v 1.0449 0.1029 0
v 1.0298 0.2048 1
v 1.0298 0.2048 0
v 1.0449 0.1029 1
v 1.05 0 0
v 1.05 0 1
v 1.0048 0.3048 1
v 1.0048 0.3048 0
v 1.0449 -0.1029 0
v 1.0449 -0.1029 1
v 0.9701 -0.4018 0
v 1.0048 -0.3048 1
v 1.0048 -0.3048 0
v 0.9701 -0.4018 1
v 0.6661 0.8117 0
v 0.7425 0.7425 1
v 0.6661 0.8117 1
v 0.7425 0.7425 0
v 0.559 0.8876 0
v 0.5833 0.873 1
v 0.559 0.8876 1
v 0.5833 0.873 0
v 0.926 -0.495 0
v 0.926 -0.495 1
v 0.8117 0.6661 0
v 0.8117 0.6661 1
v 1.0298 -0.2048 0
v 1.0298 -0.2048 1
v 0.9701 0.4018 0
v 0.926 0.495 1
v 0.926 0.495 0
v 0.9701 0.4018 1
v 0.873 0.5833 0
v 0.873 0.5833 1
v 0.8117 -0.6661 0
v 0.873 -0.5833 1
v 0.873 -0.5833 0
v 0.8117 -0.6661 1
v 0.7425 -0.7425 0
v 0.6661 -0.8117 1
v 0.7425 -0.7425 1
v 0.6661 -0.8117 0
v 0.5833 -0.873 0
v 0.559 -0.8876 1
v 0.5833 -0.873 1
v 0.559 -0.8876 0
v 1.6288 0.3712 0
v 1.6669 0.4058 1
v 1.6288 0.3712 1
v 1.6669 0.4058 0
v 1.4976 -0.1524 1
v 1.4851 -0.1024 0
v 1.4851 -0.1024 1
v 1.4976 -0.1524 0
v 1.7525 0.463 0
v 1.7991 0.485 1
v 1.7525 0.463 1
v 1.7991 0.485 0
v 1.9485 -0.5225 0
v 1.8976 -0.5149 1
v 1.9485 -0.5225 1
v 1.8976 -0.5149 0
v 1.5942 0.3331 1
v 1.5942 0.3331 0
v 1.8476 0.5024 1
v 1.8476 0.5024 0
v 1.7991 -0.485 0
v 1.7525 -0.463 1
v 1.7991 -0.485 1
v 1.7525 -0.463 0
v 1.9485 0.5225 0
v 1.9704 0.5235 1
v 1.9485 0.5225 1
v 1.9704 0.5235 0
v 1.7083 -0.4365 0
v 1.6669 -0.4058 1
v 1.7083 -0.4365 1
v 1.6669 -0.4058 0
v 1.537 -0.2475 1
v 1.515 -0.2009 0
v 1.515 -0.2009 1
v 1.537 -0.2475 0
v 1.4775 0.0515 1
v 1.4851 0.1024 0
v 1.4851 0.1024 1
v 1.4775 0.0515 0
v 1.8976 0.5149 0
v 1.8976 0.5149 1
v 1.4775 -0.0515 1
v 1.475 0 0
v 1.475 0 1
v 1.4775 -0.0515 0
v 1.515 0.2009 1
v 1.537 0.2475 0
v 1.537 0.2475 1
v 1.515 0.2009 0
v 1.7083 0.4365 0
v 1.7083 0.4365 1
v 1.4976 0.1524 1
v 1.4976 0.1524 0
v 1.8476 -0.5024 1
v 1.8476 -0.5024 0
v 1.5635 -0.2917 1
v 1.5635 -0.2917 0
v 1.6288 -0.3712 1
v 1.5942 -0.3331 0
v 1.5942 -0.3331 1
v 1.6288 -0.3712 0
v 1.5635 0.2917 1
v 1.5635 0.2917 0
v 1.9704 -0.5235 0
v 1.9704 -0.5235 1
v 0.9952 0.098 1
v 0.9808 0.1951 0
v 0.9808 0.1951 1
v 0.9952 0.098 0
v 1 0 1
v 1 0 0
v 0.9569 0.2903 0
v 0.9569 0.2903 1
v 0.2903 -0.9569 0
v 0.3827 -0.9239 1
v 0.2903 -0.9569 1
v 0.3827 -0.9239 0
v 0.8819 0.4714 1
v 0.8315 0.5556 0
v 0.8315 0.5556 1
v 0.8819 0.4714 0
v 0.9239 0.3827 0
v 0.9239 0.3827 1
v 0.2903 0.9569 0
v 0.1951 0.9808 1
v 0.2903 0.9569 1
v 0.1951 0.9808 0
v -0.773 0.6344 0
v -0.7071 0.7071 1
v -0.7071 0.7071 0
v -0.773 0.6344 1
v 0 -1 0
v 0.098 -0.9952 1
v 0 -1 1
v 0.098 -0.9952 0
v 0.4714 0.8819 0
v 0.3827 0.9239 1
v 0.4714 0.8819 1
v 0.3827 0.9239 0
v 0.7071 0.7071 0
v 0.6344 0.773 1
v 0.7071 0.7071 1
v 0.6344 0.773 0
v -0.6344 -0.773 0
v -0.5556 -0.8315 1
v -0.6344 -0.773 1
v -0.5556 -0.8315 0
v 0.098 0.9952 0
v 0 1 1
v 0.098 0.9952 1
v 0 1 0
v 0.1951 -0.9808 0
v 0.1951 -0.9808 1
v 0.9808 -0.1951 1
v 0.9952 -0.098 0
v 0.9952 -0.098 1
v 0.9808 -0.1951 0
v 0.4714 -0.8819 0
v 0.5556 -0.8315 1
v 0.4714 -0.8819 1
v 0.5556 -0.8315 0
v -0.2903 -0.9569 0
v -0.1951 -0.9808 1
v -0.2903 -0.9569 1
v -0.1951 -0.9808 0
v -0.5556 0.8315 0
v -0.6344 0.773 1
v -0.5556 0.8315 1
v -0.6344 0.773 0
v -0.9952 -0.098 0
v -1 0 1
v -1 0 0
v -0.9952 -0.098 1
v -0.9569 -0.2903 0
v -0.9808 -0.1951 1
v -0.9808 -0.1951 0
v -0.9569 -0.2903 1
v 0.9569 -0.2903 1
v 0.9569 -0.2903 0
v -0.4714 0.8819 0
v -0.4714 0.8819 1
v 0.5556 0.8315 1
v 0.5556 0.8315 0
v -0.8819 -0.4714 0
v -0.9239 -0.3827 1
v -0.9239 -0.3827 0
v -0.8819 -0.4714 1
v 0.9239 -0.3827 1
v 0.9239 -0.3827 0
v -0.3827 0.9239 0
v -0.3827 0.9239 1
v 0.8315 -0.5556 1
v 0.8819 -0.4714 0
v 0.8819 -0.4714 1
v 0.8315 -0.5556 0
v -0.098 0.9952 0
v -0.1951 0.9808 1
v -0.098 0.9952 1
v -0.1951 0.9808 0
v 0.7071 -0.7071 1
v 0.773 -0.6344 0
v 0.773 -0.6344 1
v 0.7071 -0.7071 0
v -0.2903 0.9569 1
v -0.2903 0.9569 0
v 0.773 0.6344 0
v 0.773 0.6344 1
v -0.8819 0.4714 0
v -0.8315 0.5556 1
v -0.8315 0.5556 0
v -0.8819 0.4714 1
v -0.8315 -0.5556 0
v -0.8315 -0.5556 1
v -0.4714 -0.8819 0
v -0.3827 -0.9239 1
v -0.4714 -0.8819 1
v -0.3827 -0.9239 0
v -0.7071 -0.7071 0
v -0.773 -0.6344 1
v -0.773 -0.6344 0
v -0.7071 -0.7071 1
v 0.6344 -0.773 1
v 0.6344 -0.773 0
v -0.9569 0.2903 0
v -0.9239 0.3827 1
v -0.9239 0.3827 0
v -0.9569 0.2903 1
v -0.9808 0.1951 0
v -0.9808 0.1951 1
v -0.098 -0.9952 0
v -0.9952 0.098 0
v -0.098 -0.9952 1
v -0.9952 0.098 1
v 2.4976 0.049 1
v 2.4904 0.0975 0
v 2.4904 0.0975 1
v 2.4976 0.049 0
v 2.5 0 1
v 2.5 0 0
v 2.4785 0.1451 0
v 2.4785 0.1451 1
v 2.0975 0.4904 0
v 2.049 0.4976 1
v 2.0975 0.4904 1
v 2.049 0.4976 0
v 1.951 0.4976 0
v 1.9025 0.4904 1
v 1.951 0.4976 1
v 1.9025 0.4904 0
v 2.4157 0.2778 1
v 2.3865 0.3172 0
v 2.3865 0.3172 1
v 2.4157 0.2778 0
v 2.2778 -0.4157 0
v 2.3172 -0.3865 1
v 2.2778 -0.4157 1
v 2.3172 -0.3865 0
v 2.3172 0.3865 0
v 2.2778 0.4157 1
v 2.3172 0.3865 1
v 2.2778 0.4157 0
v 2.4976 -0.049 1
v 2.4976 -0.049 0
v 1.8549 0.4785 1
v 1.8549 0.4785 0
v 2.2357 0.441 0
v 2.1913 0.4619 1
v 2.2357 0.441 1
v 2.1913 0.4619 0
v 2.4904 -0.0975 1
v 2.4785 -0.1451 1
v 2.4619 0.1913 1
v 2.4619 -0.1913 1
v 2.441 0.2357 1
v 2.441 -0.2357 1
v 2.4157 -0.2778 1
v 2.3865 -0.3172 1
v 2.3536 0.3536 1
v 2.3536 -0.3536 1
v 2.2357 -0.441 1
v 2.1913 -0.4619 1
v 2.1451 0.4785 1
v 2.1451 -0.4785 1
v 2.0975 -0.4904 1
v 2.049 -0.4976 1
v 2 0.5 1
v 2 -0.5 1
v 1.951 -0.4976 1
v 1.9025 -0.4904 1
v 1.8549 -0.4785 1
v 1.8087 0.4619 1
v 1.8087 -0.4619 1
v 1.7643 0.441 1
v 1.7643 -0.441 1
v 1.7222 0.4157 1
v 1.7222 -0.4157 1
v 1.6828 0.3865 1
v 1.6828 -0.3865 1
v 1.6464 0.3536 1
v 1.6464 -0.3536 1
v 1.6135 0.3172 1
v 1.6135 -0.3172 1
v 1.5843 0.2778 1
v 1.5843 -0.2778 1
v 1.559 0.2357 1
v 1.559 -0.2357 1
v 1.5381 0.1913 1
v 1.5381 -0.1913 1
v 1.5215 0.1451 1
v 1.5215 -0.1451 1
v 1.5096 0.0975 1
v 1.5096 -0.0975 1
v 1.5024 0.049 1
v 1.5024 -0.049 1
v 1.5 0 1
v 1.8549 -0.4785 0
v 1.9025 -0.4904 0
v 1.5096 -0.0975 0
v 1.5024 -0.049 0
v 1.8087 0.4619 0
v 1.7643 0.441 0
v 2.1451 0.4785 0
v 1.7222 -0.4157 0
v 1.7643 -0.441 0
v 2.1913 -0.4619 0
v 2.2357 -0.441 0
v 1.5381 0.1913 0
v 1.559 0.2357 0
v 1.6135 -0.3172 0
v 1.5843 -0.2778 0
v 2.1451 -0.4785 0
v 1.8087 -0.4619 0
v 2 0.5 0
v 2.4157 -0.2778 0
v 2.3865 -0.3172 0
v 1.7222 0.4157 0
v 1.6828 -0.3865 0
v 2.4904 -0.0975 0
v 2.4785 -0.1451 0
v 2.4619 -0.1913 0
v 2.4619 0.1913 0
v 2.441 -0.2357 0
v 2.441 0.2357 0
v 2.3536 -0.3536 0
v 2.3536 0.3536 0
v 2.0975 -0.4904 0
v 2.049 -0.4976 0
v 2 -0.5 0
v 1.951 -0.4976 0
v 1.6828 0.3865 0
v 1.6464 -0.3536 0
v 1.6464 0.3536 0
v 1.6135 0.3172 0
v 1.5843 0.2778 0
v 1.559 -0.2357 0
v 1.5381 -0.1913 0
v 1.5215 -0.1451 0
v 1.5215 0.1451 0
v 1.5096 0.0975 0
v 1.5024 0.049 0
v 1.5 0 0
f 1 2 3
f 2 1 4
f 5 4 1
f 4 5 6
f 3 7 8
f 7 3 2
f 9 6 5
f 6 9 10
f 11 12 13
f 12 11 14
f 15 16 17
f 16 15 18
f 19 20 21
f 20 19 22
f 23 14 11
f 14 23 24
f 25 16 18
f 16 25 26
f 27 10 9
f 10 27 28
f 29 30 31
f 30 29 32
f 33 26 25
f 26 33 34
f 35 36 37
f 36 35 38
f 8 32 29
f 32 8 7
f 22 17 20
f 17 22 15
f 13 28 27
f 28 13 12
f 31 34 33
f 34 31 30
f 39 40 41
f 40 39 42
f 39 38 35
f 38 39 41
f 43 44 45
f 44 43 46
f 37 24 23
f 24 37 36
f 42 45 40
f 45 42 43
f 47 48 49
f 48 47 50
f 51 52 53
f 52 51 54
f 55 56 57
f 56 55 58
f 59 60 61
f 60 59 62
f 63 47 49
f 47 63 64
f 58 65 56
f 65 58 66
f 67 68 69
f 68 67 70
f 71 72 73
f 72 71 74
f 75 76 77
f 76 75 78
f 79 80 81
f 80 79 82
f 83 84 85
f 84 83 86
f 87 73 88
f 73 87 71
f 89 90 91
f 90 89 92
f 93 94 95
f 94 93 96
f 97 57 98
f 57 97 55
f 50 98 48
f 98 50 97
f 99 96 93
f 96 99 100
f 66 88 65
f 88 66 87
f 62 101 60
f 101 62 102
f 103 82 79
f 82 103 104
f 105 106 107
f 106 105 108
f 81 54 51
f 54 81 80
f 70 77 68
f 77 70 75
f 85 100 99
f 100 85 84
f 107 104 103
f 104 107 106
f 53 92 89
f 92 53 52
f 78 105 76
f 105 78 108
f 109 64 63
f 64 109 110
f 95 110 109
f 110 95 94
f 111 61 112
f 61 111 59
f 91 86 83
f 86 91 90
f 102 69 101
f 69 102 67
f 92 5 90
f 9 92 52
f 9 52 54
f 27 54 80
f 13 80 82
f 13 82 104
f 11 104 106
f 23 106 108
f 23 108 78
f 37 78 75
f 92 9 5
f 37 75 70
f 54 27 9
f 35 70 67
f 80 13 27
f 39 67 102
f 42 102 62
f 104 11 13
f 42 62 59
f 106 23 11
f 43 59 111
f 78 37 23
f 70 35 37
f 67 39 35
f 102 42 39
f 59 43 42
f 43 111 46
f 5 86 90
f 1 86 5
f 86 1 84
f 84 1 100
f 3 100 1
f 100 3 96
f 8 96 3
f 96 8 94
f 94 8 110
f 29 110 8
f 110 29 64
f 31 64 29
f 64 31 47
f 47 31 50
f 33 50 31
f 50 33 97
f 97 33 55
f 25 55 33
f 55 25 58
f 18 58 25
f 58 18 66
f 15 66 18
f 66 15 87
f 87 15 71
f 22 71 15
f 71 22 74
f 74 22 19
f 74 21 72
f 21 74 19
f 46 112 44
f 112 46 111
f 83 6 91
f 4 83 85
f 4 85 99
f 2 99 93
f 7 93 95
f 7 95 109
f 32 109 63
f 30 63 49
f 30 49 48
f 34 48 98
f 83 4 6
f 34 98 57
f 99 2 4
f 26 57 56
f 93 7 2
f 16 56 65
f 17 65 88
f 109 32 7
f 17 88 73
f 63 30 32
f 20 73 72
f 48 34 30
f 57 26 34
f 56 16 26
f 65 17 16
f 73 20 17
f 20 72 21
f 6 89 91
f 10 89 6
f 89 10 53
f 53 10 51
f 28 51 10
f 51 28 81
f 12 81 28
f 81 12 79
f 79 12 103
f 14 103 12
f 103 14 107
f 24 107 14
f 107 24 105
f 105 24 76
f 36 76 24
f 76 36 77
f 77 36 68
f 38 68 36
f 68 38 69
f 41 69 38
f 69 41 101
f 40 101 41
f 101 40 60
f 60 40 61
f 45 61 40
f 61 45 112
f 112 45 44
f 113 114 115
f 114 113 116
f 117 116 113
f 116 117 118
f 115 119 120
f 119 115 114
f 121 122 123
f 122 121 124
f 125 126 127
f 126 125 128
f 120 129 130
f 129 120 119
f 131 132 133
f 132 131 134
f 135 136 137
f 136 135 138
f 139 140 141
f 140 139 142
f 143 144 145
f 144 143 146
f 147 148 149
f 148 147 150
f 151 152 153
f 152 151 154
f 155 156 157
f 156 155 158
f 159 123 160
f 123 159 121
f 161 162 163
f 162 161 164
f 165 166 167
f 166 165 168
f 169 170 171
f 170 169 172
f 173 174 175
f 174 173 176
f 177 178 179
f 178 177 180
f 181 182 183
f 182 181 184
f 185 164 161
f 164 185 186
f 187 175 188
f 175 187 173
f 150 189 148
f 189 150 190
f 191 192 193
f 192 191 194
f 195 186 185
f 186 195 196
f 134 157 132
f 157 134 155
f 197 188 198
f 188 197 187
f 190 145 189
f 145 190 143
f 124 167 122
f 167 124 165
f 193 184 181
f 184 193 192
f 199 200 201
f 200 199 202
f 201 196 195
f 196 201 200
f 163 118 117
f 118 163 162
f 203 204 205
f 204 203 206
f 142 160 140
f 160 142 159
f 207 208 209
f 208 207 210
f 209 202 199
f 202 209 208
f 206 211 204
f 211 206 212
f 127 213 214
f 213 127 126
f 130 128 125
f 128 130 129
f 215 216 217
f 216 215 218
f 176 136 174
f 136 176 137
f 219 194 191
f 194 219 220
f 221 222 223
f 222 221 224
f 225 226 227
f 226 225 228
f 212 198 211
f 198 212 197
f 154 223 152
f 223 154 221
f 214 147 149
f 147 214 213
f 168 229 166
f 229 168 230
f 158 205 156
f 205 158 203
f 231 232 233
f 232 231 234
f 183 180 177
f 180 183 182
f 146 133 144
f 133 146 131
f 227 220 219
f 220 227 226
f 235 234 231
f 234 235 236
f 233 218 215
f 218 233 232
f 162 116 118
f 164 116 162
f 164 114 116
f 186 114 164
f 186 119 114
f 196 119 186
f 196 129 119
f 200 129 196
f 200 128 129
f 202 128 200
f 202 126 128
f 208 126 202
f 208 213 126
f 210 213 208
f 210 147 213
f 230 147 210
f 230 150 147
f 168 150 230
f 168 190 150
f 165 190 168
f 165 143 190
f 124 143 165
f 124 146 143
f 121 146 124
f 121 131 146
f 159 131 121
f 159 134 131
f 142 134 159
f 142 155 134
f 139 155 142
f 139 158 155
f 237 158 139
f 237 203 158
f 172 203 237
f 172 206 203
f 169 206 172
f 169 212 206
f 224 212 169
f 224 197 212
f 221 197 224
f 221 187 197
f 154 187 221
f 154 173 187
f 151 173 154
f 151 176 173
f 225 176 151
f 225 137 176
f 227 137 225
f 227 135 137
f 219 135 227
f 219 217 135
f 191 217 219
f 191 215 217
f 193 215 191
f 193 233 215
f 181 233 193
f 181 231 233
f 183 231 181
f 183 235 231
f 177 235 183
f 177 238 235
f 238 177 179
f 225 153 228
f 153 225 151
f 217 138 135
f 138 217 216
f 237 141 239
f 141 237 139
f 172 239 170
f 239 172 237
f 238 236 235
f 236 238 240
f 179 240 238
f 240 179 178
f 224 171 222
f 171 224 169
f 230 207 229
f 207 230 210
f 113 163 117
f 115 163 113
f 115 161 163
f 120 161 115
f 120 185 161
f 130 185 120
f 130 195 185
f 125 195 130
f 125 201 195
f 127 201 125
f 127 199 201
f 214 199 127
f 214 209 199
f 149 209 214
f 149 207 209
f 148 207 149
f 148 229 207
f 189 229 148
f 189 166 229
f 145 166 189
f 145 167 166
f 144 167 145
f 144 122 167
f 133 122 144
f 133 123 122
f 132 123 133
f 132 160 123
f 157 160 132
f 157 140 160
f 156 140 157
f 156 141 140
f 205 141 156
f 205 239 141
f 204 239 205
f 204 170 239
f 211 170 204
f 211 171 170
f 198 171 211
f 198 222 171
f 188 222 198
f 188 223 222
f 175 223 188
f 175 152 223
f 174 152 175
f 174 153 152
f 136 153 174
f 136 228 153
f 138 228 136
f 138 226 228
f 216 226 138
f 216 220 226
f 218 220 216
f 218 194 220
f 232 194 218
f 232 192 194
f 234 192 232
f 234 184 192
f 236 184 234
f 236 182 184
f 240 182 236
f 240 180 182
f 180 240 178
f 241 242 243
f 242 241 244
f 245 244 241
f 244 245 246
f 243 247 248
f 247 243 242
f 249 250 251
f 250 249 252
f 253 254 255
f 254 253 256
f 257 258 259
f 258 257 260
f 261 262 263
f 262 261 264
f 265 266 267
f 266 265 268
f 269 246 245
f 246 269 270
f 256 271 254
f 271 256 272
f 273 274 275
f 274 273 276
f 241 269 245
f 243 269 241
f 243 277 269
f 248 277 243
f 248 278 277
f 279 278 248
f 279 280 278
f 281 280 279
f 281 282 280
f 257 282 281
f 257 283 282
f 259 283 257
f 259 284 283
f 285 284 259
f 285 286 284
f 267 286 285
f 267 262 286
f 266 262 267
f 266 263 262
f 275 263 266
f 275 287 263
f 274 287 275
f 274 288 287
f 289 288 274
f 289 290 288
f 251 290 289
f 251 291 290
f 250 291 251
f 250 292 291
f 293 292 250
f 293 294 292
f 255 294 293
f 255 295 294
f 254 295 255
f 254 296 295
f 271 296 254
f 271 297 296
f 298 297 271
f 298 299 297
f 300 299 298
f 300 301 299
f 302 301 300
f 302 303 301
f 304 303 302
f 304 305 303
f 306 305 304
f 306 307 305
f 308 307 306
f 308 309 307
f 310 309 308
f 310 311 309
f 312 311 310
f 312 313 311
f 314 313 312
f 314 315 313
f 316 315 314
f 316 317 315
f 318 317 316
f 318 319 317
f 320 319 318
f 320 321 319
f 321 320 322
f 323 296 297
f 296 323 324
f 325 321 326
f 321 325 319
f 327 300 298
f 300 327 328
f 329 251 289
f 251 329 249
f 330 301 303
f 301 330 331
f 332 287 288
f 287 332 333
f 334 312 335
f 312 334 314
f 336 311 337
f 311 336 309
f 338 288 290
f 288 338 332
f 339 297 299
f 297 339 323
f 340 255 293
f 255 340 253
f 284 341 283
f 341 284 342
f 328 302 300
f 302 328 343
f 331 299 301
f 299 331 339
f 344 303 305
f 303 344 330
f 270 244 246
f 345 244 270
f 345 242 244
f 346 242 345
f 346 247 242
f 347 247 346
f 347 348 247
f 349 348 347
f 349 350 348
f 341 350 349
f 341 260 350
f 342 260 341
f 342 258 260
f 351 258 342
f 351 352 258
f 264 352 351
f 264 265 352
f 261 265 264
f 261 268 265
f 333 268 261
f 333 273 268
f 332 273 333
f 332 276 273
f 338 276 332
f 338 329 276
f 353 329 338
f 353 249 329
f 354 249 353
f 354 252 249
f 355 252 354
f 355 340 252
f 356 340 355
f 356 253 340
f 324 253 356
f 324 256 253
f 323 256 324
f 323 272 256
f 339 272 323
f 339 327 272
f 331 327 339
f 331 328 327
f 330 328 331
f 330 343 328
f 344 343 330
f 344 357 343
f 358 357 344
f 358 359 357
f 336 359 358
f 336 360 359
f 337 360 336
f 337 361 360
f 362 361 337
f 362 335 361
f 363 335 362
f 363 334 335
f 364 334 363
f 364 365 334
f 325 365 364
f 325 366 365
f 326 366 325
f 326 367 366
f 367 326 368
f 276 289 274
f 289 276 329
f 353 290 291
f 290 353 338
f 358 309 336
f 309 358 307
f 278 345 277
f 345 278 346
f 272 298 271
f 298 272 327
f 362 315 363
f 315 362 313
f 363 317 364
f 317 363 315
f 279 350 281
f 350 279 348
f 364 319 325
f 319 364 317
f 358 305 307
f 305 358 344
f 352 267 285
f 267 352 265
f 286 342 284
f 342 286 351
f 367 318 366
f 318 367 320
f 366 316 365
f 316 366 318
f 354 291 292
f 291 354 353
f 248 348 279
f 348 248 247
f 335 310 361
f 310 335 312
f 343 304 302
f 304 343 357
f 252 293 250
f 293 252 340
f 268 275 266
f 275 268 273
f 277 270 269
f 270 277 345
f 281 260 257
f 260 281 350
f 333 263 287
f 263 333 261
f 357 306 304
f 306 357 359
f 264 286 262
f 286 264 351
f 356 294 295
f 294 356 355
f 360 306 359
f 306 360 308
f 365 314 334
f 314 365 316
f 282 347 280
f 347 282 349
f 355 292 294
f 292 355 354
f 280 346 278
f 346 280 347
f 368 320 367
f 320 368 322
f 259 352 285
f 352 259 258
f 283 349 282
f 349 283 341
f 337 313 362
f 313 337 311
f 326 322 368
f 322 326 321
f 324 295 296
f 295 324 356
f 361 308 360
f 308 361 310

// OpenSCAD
//------------------------------------------------------------------------------------------
// THIS CODE WAS GENERATED WITH GRAPHSCAD
//------------------------------------------------------------------------------------------
// Graphscad is a graphical nodal editor to create .SCAD files
//
// More info : http://graphscad.free.fr
//
// Scad Files created with Graphscad can be edited by graphscad
// Scad Files created with Graphscad can be read by Openscad
//
//------------------------------------------------------------------------------------------
module hulldemo()
{
 function node_cylinder_matrix(i=0,j=0,k=0,l=0,m=0,n=0) = translate([0,0,0]);
 module node_cylinder(i=0,j=0,k=0,l=0,m=0,n=0)
 {
  cylinder(r=1,r1=1,h=1,$fn=64);
 }
 function node_cylinder0_matrix(i=0,j=0,k=0,l=0,m=0,n=0) = translate([2,0,0]);
 module node_cylinder0(i=0,j=0,k=0,l=0,m=0,n=0)
 {
  translate([2,0,0])cylinder(r=0.5,r1=0.5,h=1,$fn=64);
 }
 function node_boolean0_matrix(i=0,j=0,k=0,l=0,m=0,n=0) = node_scale0_matrix(i=i,j=j,k=k,l=l,m=m,n=n);
 module node_boolean0(i=0,j=0,k=0,l=0,m=0,n=0)
 {
  union()
  {
   node_scale0(i,j,k,l,m,n);
   node_scale1(i,j,k,l,m,n);
  }
 }
 function node_hull_matrix(i=0,j=0,k=0,l=0,m=0,n=0) = node_cylinder_matrix(i=i,j=j,k=k,l=l,m=m,n=n);
 module node_hull(i=0,j=0,k=0,l=0,m=0,n=0)
 {
  hull()
  {
   node_cylinder(i,j,k,l,m,n);
   node_cylinder0(i,j,k,l,m,n);
  }
 }
 function node_boolean_matrix(i=0,j=0,k=0,l=0,m=0,n=0) = node_hull_matrix(i=i,j=j,k=k,l=l,m=m,n=n);
 module node_boolean(i=0,j=0,k=0,l=0,m=0,n=0)
 {
  difference()
  {
   node_hull(i,j,k,l,m,n);
   node_scale(i,j,k,l,m,n);
  }
 }
 function node_translate_matrix(i=0,j=0,k=0,l=0,m=0,n=0) = translate([0,0,-0.1])*node_boolean0_matrix(i=i,j=j,k=k,l=l,m=m,n=n);
 module node_translate(i=0,j=0,k=0,l=0,m=0,n=0)
 {
  translate([0,0,-0.1])node_boolean0(i,j,k,l,m,n);
 }
 function node_scale_matrix(i=0,j=0,k=0,l=0,m=0,n=0) = scale([1,1,2])*node_translate_matrix(i=i,j=j,k=k,l=l,m=m,n=n);
 module node_scale(i=0,j=0,k=0,l=0,m=0,n=0)
 {
  scale([1,1,2])node_translate(i,j,k,l,m,n);
 }
 function node_scale0_matrix(i=0,j=0,k=0,l=0,m=0,n=0) = onlytranslate(node_cylinder_matrix(i=i,j=j,k=k,l=l,m=m,n=n))*scale([1.05,1.05,1])*negonlytranslate(node_cylinder_matrix(i=i,j=j,k=k,l=l,m=m,n=n))*node_cylinder_matrix(i=i,j=j,k=k,l=l,m=m,n=n);
 module node_scale0(i=0,j=0,k=0,l=0,m=0,n=0)
 {
  multmatrix(m=onlytranslate(node_cylinder_matrix(i=i,j=j,k=k,l=l,m=m,n=n))*scale([1.05,1.05,1])*negonlytranslate(node_cylinder_matrix(i=i,j=j,k=k,l=l,m=m,n=n)))node_cylinder(i,j,k,l,m,n);
 }
 function node_scale1_matrix(i=0,j=0,k=0,l=0,m=0,n=0) = onlytranslate(node_cylinder0_matrix(i=i,j=j,k=k,l=l,m=m,n=n))*scale([1.05,1.05,1])*negonlytranslate(node_cylinder0_matrix(i=i,j=j,k=k,l=l,m=m,n=n))*node_cylinder0_matrix(i=i,j=j,k=k,l=l,m=m,n=n);
 module node_scale1(i=0,j=0,k=0,l=0,m=0,n=0)
 {
  multmatrix(m=onlytranslate(node_cylinder0_matrix(i=i,j=j,k=k,l=l,m=m,n=n))*scale([1.05,1.05,1])*negonlytranslate(node_cylinder0_matrix(i=i,j=j,k=k,l=l,m=m,n=n)))node_cylinder0(i,j,k,l,m,n);
 }
 function node_boolean1_matrix(i=0,j=0,k=0,l=0,m=0,n=0) = node_cylinder_matrix(i=i,j=j,k=k,l=l,m=m,n=n);
 module node_boolean1(i=0,j=0,k=0,l=0,m=0,n=0)
 {
  union()
  {
   node_cylinder(i,j,k,l,m,n);
   node_cylinder0(i,j,k,l,m,n);
  }
 }
 function node_color_matrix(i=0,j=0,k=0,l=0,m=0,n=0) = node_boolean_matrix(i=i,j=j,k=k,l=l,m=m,n=n);
 module node_color(i=0,j=0,k=0,l=0,m=0,n=0)
 {
  {
   color([1,1,0,1])node_boolean(i,j,k,l,m,n);
  }
 }
 function node_color0_matrix(i=0,j=0,k=0,l=0,m=0,n=0) = node_boolean1_matrix(i=i,j=j,k=k,l=l,m=m,n=n);
 module node_color0(i=0,j=0,k=0,l=0,m=0,n=0)
 {
  {
   color([1,0,0,0.6])node_boolean1(i,j,k,l,m,n);
  }
 }
 node_color();
 node_color0();
 /*--------------------------------------------------------------------------------------------------------
  Graphscad Utils functions
  This code is Used By Graphscad Nodal Editor to generate SCAD files
 --------------------------------------------------------------------------------------------------------*/
 function det4x4(a) =
 a[0][0]*a[1][1]*a[2][2]*a[3][3] + a[0][0]*a[1][2]*a[2][3]*a[3][1] + a[0][0]*a[1][3]*a[2][1]*a[3][2]
 + a[0][1]*a[1][0]*a[2][3]*a[3][2] + a[0][1]*a[1][2]*a[2][0]*a[3][3] + a[0][1]*a[1][3]*a[2][2]*a[3][0]
 + a[0][2]*a[1][0]*a[2][1]*a[3][3] + a[0][2]*a[1][1]*a[2][3]*a[3][0] + a[0][2]*a[1][3]*a[2][0]*a[3][1]
 + a[0][3]*a[1][0]*a[2][2]*a[3][1] + a[0][3]*a[1][1]*a[2][0]*a[3][2] + a[0][3]*a[1][2]*a[2][1]*a[3][0]
 - a[0][0]*a[1][1]*a[2][3]*a[3][2] - a[0][0]*a[1][2]*a[2][1]*a[3][3] - a[0][0]*a[1][3]*a[2][2]*a[3][1]
 - a[0][1]*a[1][0]*a[2][2]*a[3][3] - a[0][1]*a[1][2]*a[2][3]*a[3][0] - a[0][1]*a[1][3]*a[2][0]*a[3][2]
 - a[0][2]*a[1][0]*a[2][3]*a[3][1] - a[0][2]*a[1][1]*a[2][0]*a[3][3] - a[0][2]*a[1][3]*a[2][1]*a[3][0]
 - a[0][3]*a[1][0]*a[2][1]*a[3][2] - a[0][3]*a[1][1]*a[2][2]*a[3][0] - a[0][3]*a[1][2]*a[2][0]*a[3][1];
 function invb00(a) = a[1][1]*a[2][2]*a[3][3] + a[1][2]*a[2][3]*a[3][1] + a[1][3]*a[2][1]*a[3][2] - a[1][1]*a[2][3]*a[3][2] - a[1][2]*a[2][1]*a[3][3] - a[1][3]*a[2][2]*a[3][1];
 function invb01(a) = a[0][1]*a[2][3]*a[3][2] + a[0][2]*a[2][1]*a[3][3] + a[0][3]*a[2][2]*a[3][1] - a[0][1]*a[2][2]*a[3][3] - a[0][2]*a[2][3]*a[3][1] - a[0][3]*a[2][1]*a[3][2];
 function invb02(a) = a[0][1]*a[1][2]*a[3][3] + a[0][2]*a[1][3]*a[3][1] + a[0][3]*a[1][1]*a[3][2] - a[0][1]*a[1][3]*a[3][2] - a[0][2]*a[1][1]*a[3][3] - a[0][3]*a[1][2]*a[3][1];
 function invb03(a) = a[0][1]*a[1][3]*a[2][2] + a[0][2]*a[1][1]*a[2][3] + a[0][3]*a[1][2]*a[2][1] - a[0][1]*a[1][2]*a[2][3] - a[0][2]*a[1][3]*a[2][1] - a[0][3]*a[1][1]*a[2][2];
 function invb10(a) = a[1][0]*a[2][3]*a[3][2] + a[1][2]*a[2][0]*a[3][3] + a[1][3]*a[2][2]*a[3][0] - a[1][0]*a[2][2]*a[3][3] - a[1][2]*a[2][3]*a[3][0] - a[1][3]*a[2][0]*a[3][2];
 function invb11(a) = a[0][0]*a[2][2]*a[3][3] + a[0][2]*a[2][3]*a[3][0] + a[0][3]*a[2][0]*a[3][2] - a[0][0]*a[2][3]*a[3][2] - a[0][2]*a[2][0]*a[3][3] - a[0][3]*a[2][2]*a[3][0];
 function invb12(a) = a[0][0]*a[1][3]*a[3][2] + a[0][2]*a[1][0]*a[3][3] + a[0][3]*a[1][2]*a[3][0] - a[0][0]*a[1][2]*a[3][3] - a[0][2]*a[1][3]*a[3][0] - a[0][3]*a[1][0]*a[3][2];
 function invb13(a) = a[0][0]*a[1][2]*a[2][3] + a[0][2]*a[1][3]*a[2][0] + a[0][3]*a[1][0]*a[2][2] - a[0][0]*a[1][3]*a[2][2] - a[0][2]*a[1][0]*a[2][3] - a[0][3]*a[1][2]*a[2][0];
 function invb20(a) = a[1][0]*a[2][1]*a[3][3] + a[1][1]*a[2][3]*a[3][0] + a[1][3]*a[2][0]*a[3][1] - a[1][0]*a[2][3]*a[3][1] - a[1][1]*a[2][0]*a[3][3] - a[1][3]*a[2][1]*a[3][0];
 function invb21(a) = a[0][0]*a[2][3]*a[3][1] + a[0][1]*a[2][0]*a[3][3] + a[0][3]*a[2][1]*a[3][0] - a[0][0]*a[2][1]*a[3][3] - a[0][1]*a[2][3]*a[3][0] - a[0][3]*a[2][0]*a[3][1];
 function invb22(a) = a[0][0]*a[1][1]*a[3][3] + a[0][1]*a[1][3]*a[3][0] + a[0][3]*a[1][0]*a[3][1] - a[0][0]*a[1][3]*a[3][1] - a[0][1]*a[1][0]*a[3][3] - a[0][3]*a[1][1]*a[3][0];
 function invb23(a) = a[0][0]*a[1][3]*a[2][1] + a[0][1]*a[1][0]*a[2][3] + a[0][3]*a[1][1]*a[2][0] - a[0][0]*a[1][1]*a[2][3] - a[0][1]*a[1][3]*a[2][0] - a[0][3]*a[1][0]*a[2][1];
 function invb30(a) = a[1][0]*a[2][2]*a[3][1] + a[1][1]*a[2][0]*a[3][2] + a[1][2]*a[2][1]*a[3][0] - a[1][0]*a[2][1]*a[3][2] - a[1][1]*a[2][2]*a[3][0] - a[1][2]*a[2][0]*a[3][1];
 function invb31(a) = a[0][0]*a[2][1]*a[3][2] + a[0][1]*a[2][2]*a[3][0] + a[0][2]*a[2][0]*a[3][1] - a[0][0]*a[2][2]*a[3][1] - a[0][1]*a[2][0]*a[3][2] - a[0][2]*a[2][1]*a[3][0];
 function invb32(a) = a[0][0]*a[1][2]*a[3][1] + a[0][1]*a[1][0]*a[3][2] + a[0][2]*a[1][1]*a[3][0] - a[0][0]*a[1][1]*a[3][2] - a[0][1]*a[1][2]*a[3][0] - a[0][2]*a[1][0]*a[3][1];
 function invb33(a) = a[0][0]*a[1][1]*a[2][2] + a[0][1]*a[1][2]*a[2][0] + a[0][2]*a[1][0]*a[2][1] - a[0][0]*a[1][2]*a[2][1] - a[0][1]*a[1][0]*a[2][2] - a[0][2]*a[1][1]*a[2][0];
 function inv4x4(a)= (1/det4x4(a))*[
 [invb00(a),invb01(a),invb02(a),invb03(a)],
 [invb10(a),invb11(a),invb12(a),invb13(a)],
 [invb20(a),invb21(a),invb22(a),invb23(a)],
 [invb30(a),invb31(a),invb32(a),invb33(a)]];
 function onlytranslate(a)=  [
                        [1,0,0,a[0][3]],
                        [0,1,0,a[1][3]],
                        [0,0,1,a[2][3]],
                        [0,0,0,1]];
 function negonlytranslate(a)=[
                        [1,0,0,-a[0][3]],
                        [0,1,0,-a[1][3]],
                        [0,0,1,-a[2][3]],
                        [0,0,0,1]];
 function lookatvec(t,parentmat) = [t[0]-parentmat[0][3],
                                 t[1]-parentmat[1][3],
                                 t[2]-parentmat[2][3]];
 /*
              rx = '0'
              ry = 'acos('+tz+'/norm(['+tx+','+ty+','+tz+']))'
              rz = 'atan2('+ty+','+tx+')'
 */
 function lookatrot(t,parentmat) = [0,
                                 acos((t[2]-parentmat[2][3])/norm(lookatvec(t,parentmat))),
                                 atan2(t[1]-parentmat[1][3],t[0]-parentmat[0][3])];
 function gettranslation(m) = [m[0][3],m[1][3],m[2][3]];
 function vectormulmatrix(v,m) = m*v;
 function vectorlength(v) = norm(v);
 function vectorx(v) = v[0];
 function vectory(v) = v[1];
 function vectorz(v) = v[2];
 function vectoradd(a,b) = (a+b);
 function vectorsub(a,b) = (a-b);
 function vectormul(a,b) = (a*b);
 function vectordiv(a,b) = (a*(1/b));
 function scale(v)=[[v[0],0,0,0],
                    [0,v[1],0,0],
                    [0,0,v[2],0],
                    [0,0,0,1]];
 function rotatex(a)=[[1,0,0,0],
                      [0,cos(a),-sin(a),0],
                      [0,sin(a),cos(a),0],
                      [0,0,0,1]];
 function rotatey(a)=[[cos(a),0,sin(a),0],
                      [0,1,0,0],
                      [-sin(a),0,cos(a),0],
                      [0,0,0,1]];
 function rotatez(a)=[[cos(a),-sin(a),0,0],
                      [sin(a),cos(a),0,0],
                      [0,0,1,0],
                      [0,0,0,1]];
 function rotatea(c,s,l,m,n)=[[l*l*(1-c)+c,m*l*(1-c)-n*s,n*l*(1-c)+m*s,0],
                              [l*m*(1-c)+n*s,m*m*(1-c)+c,n*m*(1-c)-l*s,0],
                              [l*n*(1-c)-m*s,m*n*(1-c)+l*s,n*n*(1-c)+c,0],
                              [0,0,0,1]];
 function rotateanv(a,nv)=rotatea(cos(a),sin(a),nv[0],nv[1],nv[2]);
 function rotate(a,v, normV=true)=(v==undef)?rotatez(a[2])*rotatey(a[1])*rotatex(a[0]):
                      normV ? rotateanv(a,v/sqrt(v*v)) : rotateanv(a,v);
 function translate(v)=[[1,0,0,v[0]],
                        [0,1,0,v[1]],
                        [0,0,1,v[2]],
                        [0,0,0,1]];
 function mirrorabc(a,b,c)=[[1-2*a*a,-2*a*b,-2*a*c,0],
                            [-2*a*b,1-2*b*b,-2*b*c,0],
                            [-2*a*c,-2*b*c,1-2*c*c,0],
                            [0,0,0,1]];
 function mirrornv(nv)=mirrorabc(nv[0],nv[1],nv[2]);
 function mirror(v)=mirrornv(v/sqrt(v*v));
}
hulldemo();


/*BEGINGRAPHSCAD
{
    "nodes": [
        {
            "name": "node_cylinder",
            "inputplugs": [
                {
                    "type": "str",
                    "name": "radius",
                    "value": "1"
                },
                {
                    "type": "str",
                    "name": "radius2",
                    "value": ""
                },
                {
                    "type": "str",
                    "name": "height",
                    "value": "1"
                },
                {
                    "type": "str",
                    "name": "tx",
                    "value": "0"
                },
                {
                    "type": "str",
                    "name": "ty",
                    "value": "0"
                },
                {
                    "type": "str",
                    "name": "tz",
                    "value": "0"
                },
                {
                    "type": "str",
                    "name": "$fn",
                    "value": "64"
                }
            ],
            "typename": "Node_cylinder",
            "version": 1,
            "y": -206.43400000000003,
            "x": -1187.1979999999999
        },
        {
            "name": "node_cylinder0",
            "inputplugs": [
                {
                    "type": "str",
                    "name": "radius",
                    "value": "0.5"
                },
                {
                    "type": "str",
                    "name": "radius2",
                    "value": ""
                },
                {
                    "type": "str",
                    "name": "height",
                    "value": "1"
                },
                {
                    "type": "str",
                    "name": "tx",
                    "value": "2"
                },
                {
                    "type": "str",
                    "name": "ty",
                    "value": "0"
                },
                {
                    "type": "str",
                    "name": "tz",
                    "value": "0"
                },
                {
                    "type": "str",
                    "name": "$fn",
                    "value": "64"
                }
            ],
            "typename": "Node_cylinder",
            "version": 1,
            "y": 101.72599999999997,
            "x": -1185.8779999999997
        },
        {
            "name": "node_boolean0",
            "inputplugs": [
                {
                    "type": "str",
                    "name": "op",
                    "value": "union",
                    "combo": [
                        "difference",
                        "union",
                        "intersection"
                    ]
                },
                {
                    "type": "str",
                    "name": "tx",
                    "value": "0"
                },
                {
                    "type": "str",
                    "name": "ty",
                    "value": "0"
                },
                {
                    "type": "str",
                    "name": "tz",
                    "value": "0"
                },
                {
                    "connection": "node_scale0.object",
                    "type": "object",
                    "name": "object1",
                    "value": ""
                },
                {
                    "connection": "node_scale1.object",
                    "type": "object",
                    "name": "object2",
                    "value": ""
                },
                {
                    "type": "object",
                    "name": "object3",
                    "value": ""
                },
                {
                    "type": "object",
                    "name": "object4",
                    "value": ""
                },
                {
                    "type": "object",
                    "name": "object5",
                    "value": ""
                },
                {
                    "type": "object",
                    "name": "object6",
                    "value": ""
                },
                {
                    "type": "object",
                    "name": "object7",
                    "value": ""
                },
                {
                    "type": "object",
                    "name": "object8",
                    "value": ""
                }
            ],
            "typename": "Node_boolean",
            "version": 1,
            "y": -289.63399999999996,
            "x": -422.3979999999999
        },
        {
            "name": "node_hull",
            "inputplugs": [
                {
                    "type": "str",
                    "name": "tx",
                    "value": "0"
                },
                {
                    "type": "str",
                    "name": "ty",
                    "value": "0"
                },
                {
                    "type": "str",
                    "name": "tz",
                    "value": "0"
                },
                {
                    "connection": "node_cylinder.object",
                    "type": "object",
                    "name": "object1",
                    "value": ""
                },
                {
                    "connection": "node_cylinder0.object",
                    "type": "object",
                    "name": "object2",
                    "value": ""
                },
                {
                    "type": "object",
                    "name": "object3",
                    "value": ""
                },
                {
                    "type": "object",
                    "name": "object4",
                    "value": ""
                },
                {
                    "type": "object",
                    "name": "object5",
                    "value": ""
                },
                {
                    "type": "object",
                    "name": "object6",
                    "value": ""
                },
                {
                    "type": "object",
                    "name": "object7",
                    "value": ""
                },
                {
                    "type": "object",
                    "name": "object8",
                    "value": ""
                }
            ],
            "typename": "Node_hull",
            "version": 1,
            "y": 59.8484375000001,
            "x": -318.0187499999997
        },
        {
            "name": "node_boolean",
            "inputplugs": [
                {
                    "type": "str",
                    "name": "op",
                    "value": "difference",
                    "combo": [
                        "difference",
                        "union",
                        "intersection"
                    ]
                },
                {
                    "type": "str",
                    "name": "tx",
                    "value": "0"
                },
                {
                    "type": "str",
                    "name": "ty",
                    "value": "0"
                },
                {
                    "type": "str",
                    "name": "tz",
                    "value": "0"
                },
                {
                    "connection": "node_hull.object",
                    "type": "object",
                    "name": "object1",
                    "value": ""
                },
                {
                    "connection": "node_scale.object",
                    "type": "object",
                    "name": "object2",
                    "value": ""
                },
                {
                    "type": "object",
                    "name": "object3",
                    "value": ""
                },
                {
                    "type": "object",
                    "name": "object4",
                    "value": ""
                },
                {
                    "type": "object",
                    "name": "object5",
                    "value": ""
                },
                {
                    "type": "object",
                    "name": "object6",
                    "value": ""
                },
                {
                    "type": "object",
                    "name": "object7",
                    "value": ""
                },
                {
                    "type": "object",
                    "name": "object8",
                    "value": ""
                }
            ],
            "typename": "Node_boolean",
            "version": 1,
            "y": -168.1515624999999,
            "x": 231.98125000000027
        },
        {
            "name": "node_translate",
            "inputplugs": [
                {
                    "connection": "node_boolean0.object",
                    "type": "object",
                    "name": "object",
                    "value": ""
                },
                {
                    "type": "str",
                    "name": "tx",
                    "value": "0"
                },
                {
                    "type": "str",
                    "name": "ty",
                    "value": "0"
                },
                {
                    "type": "str",
                    "name": "tz",
                    "value": "-0.1"
                },
                {
                    "type": "str",
                    "name": "space",
                    "value": "world",
                    "combo": [
                        "world",
                        "object",
                        "local"
                    ]
                }
            ],
            "typename": "Node_translate",
            "version": 1,
            "y": -268.1515624999999,
            "x": -213.01874999999973
        },
        {
            "name": "node_scale",
            "inputplugs": [
                {
                    "connection": "node_translate.object",
                    "type": "object",
                    "name": "object",
                    "value": ""
                },
                {
                    "type": "str",
                    "name": "sx",
                    "value": "1"
                },
                {
                    "type": "str",
                    "name": "sy",
                    "value": "1"
                },
                {
                    "type": "str",
                    "name": "sz",
                    "value": "2"
                },
                {
                    "type": "str",
                    "name": "space",
                    "value": "world",
                    "combo": [
                        "world",
                        "object",
                        "local"
                    ]
                }
            ],
            "typename": "Node_scale",
            "version": 1,
            "y": -252.1515624999999,
            "x": -16.018749999999727
        },
        {
            "name": "node_scale0",
            "inputplugs": [
                {
                    "connection": "node_cylinder.object",
                    "type": "object",
                    "name": "object",
                    "value": ""
                },
                {
                    "type": "str",
                    "name": "sx",
                    "value": "1.05"
                },
                {
                    "type": "str",
                    "name": "sy",
                    "value": "1.05"
                },
                {
                    "type": "str",
                    "name": "sz",
                    "value": "1"
                },
                {
                    "type": "str",
                    "name": "space",
                    "value": "local",
                    "combo": [
                        "world",
                        "object",
                        "local"
                    ]
                }
            ],
            "typename": "Node_scale",
            "version": 1,
            "y": -420.1515624999999,
            "x": -635.0187499999997
        },
        {
            "name": "node_scale1",
            "inputplugs": [
                {
                    "connection": "node_cylinder0.object",
                    "type": "object",
                    "name": "object",
                    "value": ""
                },
                {
                    "type": "str",
                    "name": "sx",
                    "value": "1.05"
                },
                {
                    "type": "str",
                    "name": "sy",
                    "value": "1.05"
                },
                {
                    "type": "str",
                    "name": "sz",
                    "value": "1"
                },
                {
                    "type": "str",
                    "name": "space",
                    "value": "local",
                    "combo": [
                        "world",
                        "object",
                        "local"
                    ]
                }
            ],
            "typename": "Node_scale",
            "version": 1,
            "y": -166.1515624999999,
            "x": -633.0187499999997
        },
        {
            "name": "node_boolean1",
            "inputplugs": [
                {
                    "type": "str",
                    "name": "op",
                    "value": "union",
                    "combo": [
                        "difference",
                        "union",
                        "intersection"
                    ]
                },
                {
                    "type": "str",
                    "name": "tx",
                    "value": "0"
                },
                {
                    "type": "str",
                    "name": "ty",
                    "value": "0"
                },
                {
                    "type": "str",
                    "name": "tz",
                    "value": "0"
                },
                {
                    "connection": "node_cylinder.object",
                    "type": "object",
                    "name": "object1",
                    "value": ""
                },
                {
                    "connection": "node_cylinder0.object",
                    "type": "object",
                    "name": "object2",
                    "value": ""
                },
                {
                    "type": "object",
                    "name": "object3",
                    "value": ""
                },
                {
                    "type": "object",
                    "name": "object4",
                    "value": ""
                },
                {
                    "type": "object",
                    "name": "object5",
                    "value": ""
                },
                {
                    "type": "object",
                    "name": "object6",
                    "value": ""
                },
                {
                    "type": "object",
                    "name": "object7",
                    "value": ""
                },
                {
                    "type": "object",
                    "name": "object8",
                    "value": ""
                }
            ],
            "typename": "Node_boolean",
            "version": 1,
            "y": 315.2311312500002,
            "x": -541.9235937499993
        },
        {
            "name": "node_color",
            "inputplugs": [
                {
                    "connection": "node_boolean.object",
                    "type": "object",
                    "name": "object",
                    "value": ""
                },
                {
                    "type": "str",
                    "name": "r",
                    "value": "1"
                },
                {
                    "type": "str",
                    "name": "g",
                    "value": "1"
                },
                {
                    "type": "str",
                    "name": "b",
                    "value": "0"
                },
                {
                    "type": "str",
                    "name": "a",
                    "value": "1"
                }
            ],
            "typename": "Node_color",
            "version": 1,
            "y": -143.7057812499999,
            "x": 449.4978124999998
        },
        {
            "name": "node_color0",
            "inputplugs": [
                {
                    "connection": "node_boolean1.object",
                    "type": "object",
                    "name": "object",
                    "value": ""
                },
                {
                    "type": "str",
                    "name": "r",
                    "value": "1"
                },
                {
                    "type": "str",
                    "name": "g",
                    "value": "0"
                },
                {
                    "type": "str",
                    "name": "b",
                    "value": "0"
                },
                {
                    "type": "str",
                    "name": "a",
                    "value": "0.6"
                }
            ],
            "typename": "Node_color",
            "version": 1,
            "y": 390.0,
            "x": -310.0
        }
    ],
    "version": 2
}
ENDGRAPHSCAD*/
